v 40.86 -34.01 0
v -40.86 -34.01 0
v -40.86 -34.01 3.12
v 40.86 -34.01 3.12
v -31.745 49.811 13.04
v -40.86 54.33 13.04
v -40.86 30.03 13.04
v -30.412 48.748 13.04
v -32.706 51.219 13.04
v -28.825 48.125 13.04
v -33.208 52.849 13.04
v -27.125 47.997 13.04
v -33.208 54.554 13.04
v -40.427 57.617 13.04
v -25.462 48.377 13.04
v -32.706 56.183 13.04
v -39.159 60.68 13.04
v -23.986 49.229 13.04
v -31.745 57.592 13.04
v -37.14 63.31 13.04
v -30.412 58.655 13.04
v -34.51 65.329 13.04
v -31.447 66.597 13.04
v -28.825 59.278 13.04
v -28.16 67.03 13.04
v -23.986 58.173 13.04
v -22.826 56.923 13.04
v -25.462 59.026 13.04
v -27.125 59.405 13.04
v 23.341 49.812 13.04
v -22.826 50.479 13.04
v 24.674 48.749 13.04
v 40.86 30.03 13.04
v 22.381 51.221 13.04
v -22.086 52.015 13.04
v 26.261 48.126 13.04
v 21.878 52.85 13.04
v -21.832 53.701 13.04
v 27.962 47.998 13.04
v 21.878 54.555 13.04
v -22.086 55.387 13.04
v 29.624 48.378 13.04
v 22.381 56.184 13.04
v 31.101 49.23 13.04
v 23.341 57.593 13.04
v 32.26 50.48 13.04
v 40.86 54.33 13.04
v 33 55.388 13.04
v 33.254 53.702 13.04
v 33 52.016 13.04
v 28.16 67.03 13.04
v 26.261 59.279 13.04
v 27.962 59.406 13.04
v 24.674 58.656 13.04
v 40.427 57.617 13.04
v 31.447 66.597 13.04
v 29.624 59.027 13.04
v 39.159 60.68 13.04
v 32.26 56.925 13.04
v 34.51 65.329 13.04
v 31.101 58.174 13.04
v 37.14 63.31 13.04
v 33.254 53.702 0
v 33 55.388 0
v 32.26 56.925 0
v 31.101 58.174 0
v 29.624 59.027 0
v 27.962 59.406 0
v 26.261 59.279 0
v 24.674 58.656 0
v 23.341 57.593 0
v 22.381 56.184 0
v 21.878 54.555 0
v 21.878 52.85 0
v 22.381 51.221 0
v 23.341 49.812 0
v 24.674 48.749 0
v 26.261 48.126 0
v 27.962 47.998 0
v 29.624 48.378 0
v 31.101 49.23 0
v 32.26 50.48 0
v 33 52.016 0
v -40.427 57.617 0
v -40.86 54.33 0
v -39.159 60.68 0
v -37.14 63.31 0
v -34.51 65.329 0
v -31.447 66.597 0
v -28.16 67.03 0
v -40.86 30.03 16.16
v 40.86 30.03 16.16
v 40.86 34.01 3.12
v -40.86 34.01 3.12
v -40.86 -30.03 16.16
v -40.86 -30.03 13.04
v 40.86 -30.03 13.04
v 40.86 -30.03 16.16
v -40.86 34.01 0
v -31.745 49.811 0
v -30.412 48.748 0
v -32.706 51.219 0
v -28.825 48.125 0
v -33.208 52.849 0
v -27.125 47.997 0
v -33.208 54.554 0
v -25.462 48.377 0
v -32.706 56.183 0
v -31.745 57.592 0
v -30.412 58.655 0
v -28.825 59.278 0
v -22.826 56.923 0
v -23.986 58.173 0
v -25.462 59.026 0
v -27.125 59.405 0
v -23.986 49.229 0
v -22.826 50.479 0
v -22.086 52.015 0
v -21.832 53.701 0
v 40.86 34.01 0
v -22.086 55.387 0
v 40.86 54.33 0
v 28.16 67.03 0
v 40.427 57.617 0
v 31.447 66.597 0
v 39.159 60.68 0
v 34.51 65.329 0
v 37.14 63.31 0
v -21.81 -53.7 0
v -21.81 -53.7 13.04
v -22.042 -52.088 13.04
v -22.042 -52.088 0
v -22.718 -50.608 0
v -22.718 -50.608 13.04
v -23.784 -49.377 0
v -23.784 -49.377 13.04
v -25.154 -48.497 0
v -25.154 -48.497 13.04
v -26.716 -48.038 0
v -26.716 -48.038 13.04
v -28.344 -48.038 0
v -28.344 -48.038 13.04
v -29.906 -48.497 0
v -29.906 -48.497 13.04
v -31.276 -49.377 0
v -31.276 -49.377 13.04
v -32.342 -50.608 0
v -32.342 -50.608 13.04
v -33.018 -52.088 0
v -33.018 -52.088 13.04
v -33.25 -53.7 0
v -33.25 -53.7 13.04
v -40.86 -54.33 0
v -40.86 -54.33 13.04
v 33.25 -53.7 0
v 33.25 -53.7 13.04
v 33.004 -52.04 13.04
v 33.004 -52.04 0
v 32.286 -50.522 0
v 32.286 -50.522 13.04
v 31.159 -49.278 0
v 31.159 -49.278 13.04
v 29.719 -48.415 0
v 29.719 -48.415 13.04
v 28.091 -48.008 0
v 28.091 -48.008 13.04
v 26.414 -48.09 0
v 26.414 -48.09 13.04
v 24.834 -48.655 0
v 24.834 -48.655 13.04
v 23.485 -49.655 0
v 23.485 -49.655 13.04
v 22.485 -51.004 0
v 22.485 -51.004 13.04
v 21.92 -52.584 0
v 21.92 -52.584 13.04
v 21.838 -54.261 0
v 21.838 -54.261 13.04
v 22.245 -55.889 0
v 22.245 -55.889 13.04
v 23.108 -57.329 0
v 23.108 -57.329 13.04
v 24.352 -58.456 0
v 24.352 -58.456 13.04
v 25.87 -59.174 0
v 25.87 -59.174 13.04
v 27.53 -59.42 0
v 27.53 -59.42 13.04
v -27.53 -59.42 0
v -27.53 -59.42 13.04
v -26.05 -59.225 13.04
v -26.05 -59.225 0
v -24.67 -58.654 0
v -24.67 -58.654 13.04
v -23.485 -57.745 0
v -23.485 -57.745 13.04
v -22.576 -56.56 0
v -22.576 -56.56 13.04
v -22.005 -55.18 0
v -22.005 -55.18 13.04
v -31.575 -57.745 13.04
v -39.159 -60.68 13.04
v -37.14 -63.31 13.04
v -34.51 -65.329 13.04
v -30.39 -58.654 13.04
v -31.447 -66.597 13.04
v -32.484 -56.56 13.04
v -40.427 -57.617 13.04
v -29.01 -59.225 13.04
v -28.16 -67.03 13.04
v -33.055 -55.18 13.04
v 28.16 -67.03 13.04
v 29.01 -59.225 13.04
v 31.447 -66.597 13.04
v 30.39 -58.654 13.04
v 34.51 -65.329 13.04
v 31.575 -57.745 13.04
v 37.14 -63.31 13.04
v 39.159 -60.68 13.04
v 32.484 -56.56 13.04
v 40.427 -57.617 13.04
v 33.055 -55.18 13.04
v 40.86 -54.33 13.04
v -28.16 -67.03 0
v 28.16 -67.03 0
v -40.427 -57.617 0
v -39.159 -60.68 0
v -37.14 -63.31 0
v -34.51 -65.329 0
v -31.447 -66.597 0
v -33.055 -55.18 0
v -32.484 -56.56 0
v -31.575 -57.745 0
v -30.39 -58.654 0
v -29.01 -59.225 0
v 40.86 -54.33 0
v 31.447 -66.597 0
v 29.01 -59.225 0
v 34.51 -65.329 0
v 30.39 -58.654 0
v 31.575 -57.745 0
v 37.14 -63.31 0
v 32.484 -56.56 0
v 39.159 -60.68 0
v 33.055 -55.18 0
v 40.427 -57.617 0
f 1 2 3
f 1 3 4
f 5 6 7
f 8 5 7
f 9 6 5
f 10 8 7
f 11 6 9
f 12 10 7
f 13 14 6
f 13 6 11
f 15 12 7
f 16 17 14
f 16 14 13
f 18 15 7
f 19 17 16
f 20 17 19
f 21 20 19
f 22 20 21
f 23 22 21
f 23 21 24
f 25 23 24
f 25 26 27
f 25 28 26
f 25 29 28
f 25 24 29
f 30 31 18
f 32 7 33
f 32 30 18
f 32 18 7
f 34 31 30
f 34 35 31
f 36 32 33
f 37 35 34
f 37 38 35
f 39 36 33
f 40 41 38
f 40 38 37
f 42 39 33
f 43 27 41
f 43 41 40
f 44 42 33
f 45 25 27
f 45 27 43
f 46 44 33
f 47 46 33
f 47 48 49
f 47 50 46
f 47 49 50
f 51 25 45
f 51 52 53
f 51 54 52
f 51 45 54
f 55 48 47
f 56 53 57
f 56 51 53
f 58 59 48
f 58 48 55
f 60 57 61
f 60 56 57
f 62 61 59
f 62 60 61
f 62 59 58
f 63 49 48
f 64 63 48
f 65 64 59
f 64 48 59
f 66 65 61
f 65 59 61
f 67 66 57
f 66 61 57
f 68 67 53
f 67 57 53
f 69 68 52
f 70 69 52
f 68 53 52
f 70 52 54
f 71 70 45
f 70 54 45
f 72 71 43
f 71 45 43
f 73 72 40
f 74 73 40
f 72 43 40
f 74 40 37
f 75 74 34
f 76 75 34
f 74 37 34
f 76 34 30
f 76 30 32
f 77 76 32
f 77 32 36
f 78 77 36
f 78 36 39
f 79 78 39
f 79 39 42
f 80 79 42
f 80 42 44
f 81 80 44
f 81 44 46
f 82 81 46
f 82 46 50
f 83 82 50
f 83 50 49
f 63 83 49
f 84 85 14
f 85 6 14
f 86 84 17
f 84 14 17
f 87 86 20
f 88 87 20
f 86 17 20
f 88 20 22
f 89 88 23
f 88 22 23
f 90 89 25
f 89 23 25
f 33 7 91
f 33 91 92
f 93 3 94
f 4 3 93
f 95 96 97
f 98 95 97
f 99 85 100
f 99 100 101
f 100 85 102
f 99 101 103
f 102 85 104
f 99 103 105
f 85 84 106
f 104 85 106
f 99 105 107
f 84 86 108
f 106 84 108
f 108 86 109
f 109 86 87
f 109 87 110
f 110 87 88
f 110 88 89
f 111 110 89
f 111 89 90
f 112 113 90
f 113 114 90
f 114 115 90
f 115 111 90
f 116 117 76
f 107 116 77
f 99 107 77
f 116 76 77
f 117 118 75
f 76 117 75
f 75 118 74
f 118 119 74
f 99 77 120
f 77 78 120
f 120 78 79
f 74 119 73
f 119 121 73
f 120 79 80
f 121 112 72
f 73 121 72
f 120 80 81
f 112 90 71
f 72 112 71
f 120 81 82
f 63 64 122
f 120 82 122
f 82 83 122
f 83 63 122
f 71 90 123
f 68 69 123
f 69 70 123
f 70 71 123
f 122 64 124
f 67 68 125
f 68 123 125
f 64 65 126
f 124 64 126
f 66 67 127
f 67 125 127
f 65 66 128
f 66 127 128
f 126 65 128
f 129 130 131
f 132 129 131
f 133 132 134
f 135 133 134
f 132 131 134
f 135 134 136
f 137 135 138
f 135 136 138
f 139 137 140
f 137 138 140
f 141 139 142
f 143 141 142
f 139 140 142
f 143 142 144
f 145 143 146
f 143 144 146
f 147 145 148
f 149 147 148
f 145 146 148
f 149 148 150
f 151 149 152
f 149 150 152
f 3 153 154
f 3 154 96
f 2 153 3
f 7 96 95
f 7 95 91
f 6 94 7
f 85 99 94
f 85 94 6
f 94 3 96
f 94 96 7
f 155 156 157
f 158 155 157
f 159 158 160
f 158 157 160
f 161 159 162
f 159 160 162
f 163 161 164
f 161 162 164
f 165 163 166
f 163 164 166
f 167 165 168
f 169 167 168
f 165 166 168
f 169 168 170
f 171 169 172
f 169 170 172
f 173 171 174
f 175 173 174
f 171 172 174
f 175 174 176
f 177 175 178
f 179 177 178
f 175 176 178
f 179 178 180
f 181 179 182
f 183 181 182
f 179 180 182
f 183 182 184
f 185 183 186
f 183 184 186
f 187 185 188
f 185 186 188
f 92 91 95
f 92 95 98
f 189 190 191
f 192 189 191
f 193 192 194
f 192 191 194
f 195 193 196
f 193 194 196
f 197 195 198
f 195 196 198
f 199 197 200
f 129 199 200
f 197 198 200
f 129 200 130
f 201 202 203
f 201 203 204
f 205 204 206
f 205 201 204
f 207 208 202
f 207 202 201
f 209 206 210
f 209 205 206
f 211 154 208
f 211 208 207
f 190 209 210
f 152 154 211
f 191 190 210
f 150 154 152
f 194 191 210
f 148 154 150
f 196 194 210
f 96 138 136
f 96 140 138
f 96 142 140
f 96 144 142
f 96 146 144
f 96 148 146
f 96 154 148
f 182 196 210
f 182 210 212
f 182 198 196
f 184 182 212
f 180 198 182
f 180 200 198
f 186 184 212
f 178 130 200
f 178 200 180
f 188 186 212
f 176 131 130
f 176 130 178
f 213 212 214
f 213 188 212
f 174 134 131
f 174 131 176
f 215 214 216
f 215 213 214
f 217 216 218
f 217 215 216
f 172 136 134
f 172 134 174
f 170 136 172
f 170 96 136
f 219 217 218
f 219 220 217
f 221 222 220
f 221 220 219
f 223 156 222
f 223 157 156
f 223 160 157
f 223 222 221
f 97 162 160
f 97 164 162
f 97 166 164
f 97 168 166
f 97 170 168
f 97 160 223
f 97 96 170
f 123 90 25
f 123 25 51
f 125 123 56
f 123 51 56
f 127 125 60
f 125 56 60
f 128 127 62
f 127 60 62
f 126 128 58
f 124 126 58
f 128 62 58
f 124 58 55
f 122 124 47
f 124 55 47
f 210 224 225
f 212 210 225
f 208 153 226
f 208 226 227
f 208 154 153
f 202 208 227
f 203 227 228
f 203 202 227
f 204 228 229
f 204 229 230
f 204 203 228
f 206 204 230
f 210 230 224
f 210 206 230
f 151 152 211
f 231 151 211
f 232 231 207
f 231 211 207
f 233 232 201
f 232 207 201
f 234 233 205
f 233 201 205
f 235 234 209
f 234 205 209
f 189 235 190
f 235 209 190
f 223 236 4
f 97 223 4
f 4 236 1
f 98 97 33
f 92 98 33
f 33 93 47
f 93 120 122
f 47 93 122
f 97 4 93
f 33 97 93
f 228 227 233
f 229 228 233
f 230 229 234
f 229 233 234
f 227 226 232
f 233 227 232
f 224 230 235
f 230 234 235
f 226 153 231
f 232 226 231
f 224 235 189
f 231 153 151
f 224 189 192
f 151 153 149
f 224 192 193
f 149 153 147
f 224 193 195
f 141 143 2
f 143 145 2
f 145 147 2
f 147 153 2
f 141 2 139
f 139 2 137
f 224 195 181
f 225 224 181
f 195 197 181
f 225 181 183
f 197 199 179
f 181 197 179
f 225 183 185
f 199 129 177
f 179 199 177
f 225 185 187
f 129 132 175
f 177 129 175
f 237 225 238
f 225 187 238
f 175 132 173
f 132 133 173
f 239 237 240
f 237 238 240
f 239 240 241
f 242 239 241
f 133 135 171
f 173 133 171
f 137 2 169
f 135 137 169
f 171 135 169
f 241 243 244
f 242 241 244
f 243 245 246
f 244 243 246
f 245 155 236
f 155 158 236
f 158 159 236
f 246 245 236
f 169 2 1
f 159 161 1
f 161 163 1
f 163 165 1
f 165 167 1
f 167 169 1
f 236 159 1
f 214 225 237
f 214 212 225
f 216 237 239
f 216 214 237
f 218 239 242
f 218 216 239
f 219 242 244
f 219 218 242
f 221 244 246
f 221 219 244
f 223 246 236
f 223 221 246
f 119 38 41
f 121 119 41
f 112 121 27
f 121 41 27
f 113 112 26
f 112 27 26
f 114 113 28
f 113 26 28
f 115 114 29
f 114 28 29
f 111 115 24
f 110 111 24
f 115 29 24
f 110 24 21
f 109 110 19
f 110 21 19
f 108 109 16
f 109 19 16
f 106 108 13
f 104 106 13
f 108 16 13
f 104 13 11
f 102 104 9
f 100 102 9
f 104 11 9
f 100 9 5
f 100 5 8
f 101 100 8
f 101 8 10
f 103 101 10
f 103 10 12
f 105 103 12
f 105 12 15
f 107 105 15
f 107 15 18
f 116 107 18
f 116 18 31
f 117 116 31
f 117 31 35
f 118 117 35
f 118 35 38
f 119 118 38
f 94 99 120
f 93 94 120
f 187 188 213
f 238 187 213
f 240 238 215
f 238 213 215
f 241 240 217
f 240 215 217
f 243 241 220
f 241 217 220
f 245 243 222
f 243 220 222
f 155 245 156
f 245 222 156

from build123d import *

# Parameters (mm, degrees)
F0_W     = 81.72
F0_H     = 134.06
F1_DEPTH = 13.04
F2_W     = 81.72
F2_H     = 60.06
F3_DEPTH = 3.12
F4_W     = 81.72
F4_H     = 68.02
F5_DEPTH = 3.12
F6_R     = 5.72
F7_DEPTH = 25.4
F9_DEPTH = 25.4
F10_R    = 12.7


with BuildPart() as f1:
    # F0 (on Top) → F1 (new body)
    with BuildSketch(Plane.XY):
        Rectangle(F0_W, F0_H)
    extrude(amount=F1_DEPTH)

    # F2 (on face) → F3 (join)
    with BuildSketch(Plane.XY.offset(13.04)):
        Rectangle(F2_W, F2_H)
    extrude(amount=F3_DEPTH)

    # F4 (on face) → F5 (cut)
    with BuildSketch(Plane(origin=(0, 0, 0), x_dir=(1, 0, 0), z_dir=(0, 0, -1))):
        Rectangle(F4_W, F4_H)
    extrude(amount=-F5_DEPTH, mode=Mode.SUBTRACT)

    # F6 (on face) → F7 (cut)
    with BuildSketch(Plane.XY.offset(13.04)):
        with Locations((-27.55223, 53.701179)):
            Circle(F6_R)
        with Locations((27.534222, 53.702354)):
            Circle(F6_R)
    extrude(amount=-F7_DEPTH, mode=Mode.SUBTRACT)

    # F8 (on face) → F9 (cut)
    with BuildSketch(Plane.XY.offset(13.04)):
        with BuildLine():
            ThreePointArc((-27.53, -59.42), (-23.485349, -57.744651), (-21.81, -53.7))
            ThreePointArc((-21.81, -53.7), (-27.53, -47.98), (-33.25, -53.7))
            ThreePointArc((-33.25, -53.7), (-31.574651, -57.744651), (-27.53, -59.42))
        make_face()
        with BuildLine():
            ThreePointArc((27.53, -59.42), (31.574651, -57.744651), (33.25, -53.7))
            ThreePointArc((33.25, -53.7), (23.485349, -49.655349), (27.53, -59.42))
        make_face()
    extrude(amount=-F9_DEPTH, mode=Mode.SUBTRACT)

    # F10
    f10_edges = [f1.edges().sort_by_distance(p)[0] for p in [
        (-40.86, 67.03, 6.52),
        (40.86, 67.03, 6.52),
        (40.86, -67.03, 6.52),
        (-40.86, -67.03, 6.52),
    ]]
    fillet(f10_edges, radius=F10_R)


solid = f1.part
